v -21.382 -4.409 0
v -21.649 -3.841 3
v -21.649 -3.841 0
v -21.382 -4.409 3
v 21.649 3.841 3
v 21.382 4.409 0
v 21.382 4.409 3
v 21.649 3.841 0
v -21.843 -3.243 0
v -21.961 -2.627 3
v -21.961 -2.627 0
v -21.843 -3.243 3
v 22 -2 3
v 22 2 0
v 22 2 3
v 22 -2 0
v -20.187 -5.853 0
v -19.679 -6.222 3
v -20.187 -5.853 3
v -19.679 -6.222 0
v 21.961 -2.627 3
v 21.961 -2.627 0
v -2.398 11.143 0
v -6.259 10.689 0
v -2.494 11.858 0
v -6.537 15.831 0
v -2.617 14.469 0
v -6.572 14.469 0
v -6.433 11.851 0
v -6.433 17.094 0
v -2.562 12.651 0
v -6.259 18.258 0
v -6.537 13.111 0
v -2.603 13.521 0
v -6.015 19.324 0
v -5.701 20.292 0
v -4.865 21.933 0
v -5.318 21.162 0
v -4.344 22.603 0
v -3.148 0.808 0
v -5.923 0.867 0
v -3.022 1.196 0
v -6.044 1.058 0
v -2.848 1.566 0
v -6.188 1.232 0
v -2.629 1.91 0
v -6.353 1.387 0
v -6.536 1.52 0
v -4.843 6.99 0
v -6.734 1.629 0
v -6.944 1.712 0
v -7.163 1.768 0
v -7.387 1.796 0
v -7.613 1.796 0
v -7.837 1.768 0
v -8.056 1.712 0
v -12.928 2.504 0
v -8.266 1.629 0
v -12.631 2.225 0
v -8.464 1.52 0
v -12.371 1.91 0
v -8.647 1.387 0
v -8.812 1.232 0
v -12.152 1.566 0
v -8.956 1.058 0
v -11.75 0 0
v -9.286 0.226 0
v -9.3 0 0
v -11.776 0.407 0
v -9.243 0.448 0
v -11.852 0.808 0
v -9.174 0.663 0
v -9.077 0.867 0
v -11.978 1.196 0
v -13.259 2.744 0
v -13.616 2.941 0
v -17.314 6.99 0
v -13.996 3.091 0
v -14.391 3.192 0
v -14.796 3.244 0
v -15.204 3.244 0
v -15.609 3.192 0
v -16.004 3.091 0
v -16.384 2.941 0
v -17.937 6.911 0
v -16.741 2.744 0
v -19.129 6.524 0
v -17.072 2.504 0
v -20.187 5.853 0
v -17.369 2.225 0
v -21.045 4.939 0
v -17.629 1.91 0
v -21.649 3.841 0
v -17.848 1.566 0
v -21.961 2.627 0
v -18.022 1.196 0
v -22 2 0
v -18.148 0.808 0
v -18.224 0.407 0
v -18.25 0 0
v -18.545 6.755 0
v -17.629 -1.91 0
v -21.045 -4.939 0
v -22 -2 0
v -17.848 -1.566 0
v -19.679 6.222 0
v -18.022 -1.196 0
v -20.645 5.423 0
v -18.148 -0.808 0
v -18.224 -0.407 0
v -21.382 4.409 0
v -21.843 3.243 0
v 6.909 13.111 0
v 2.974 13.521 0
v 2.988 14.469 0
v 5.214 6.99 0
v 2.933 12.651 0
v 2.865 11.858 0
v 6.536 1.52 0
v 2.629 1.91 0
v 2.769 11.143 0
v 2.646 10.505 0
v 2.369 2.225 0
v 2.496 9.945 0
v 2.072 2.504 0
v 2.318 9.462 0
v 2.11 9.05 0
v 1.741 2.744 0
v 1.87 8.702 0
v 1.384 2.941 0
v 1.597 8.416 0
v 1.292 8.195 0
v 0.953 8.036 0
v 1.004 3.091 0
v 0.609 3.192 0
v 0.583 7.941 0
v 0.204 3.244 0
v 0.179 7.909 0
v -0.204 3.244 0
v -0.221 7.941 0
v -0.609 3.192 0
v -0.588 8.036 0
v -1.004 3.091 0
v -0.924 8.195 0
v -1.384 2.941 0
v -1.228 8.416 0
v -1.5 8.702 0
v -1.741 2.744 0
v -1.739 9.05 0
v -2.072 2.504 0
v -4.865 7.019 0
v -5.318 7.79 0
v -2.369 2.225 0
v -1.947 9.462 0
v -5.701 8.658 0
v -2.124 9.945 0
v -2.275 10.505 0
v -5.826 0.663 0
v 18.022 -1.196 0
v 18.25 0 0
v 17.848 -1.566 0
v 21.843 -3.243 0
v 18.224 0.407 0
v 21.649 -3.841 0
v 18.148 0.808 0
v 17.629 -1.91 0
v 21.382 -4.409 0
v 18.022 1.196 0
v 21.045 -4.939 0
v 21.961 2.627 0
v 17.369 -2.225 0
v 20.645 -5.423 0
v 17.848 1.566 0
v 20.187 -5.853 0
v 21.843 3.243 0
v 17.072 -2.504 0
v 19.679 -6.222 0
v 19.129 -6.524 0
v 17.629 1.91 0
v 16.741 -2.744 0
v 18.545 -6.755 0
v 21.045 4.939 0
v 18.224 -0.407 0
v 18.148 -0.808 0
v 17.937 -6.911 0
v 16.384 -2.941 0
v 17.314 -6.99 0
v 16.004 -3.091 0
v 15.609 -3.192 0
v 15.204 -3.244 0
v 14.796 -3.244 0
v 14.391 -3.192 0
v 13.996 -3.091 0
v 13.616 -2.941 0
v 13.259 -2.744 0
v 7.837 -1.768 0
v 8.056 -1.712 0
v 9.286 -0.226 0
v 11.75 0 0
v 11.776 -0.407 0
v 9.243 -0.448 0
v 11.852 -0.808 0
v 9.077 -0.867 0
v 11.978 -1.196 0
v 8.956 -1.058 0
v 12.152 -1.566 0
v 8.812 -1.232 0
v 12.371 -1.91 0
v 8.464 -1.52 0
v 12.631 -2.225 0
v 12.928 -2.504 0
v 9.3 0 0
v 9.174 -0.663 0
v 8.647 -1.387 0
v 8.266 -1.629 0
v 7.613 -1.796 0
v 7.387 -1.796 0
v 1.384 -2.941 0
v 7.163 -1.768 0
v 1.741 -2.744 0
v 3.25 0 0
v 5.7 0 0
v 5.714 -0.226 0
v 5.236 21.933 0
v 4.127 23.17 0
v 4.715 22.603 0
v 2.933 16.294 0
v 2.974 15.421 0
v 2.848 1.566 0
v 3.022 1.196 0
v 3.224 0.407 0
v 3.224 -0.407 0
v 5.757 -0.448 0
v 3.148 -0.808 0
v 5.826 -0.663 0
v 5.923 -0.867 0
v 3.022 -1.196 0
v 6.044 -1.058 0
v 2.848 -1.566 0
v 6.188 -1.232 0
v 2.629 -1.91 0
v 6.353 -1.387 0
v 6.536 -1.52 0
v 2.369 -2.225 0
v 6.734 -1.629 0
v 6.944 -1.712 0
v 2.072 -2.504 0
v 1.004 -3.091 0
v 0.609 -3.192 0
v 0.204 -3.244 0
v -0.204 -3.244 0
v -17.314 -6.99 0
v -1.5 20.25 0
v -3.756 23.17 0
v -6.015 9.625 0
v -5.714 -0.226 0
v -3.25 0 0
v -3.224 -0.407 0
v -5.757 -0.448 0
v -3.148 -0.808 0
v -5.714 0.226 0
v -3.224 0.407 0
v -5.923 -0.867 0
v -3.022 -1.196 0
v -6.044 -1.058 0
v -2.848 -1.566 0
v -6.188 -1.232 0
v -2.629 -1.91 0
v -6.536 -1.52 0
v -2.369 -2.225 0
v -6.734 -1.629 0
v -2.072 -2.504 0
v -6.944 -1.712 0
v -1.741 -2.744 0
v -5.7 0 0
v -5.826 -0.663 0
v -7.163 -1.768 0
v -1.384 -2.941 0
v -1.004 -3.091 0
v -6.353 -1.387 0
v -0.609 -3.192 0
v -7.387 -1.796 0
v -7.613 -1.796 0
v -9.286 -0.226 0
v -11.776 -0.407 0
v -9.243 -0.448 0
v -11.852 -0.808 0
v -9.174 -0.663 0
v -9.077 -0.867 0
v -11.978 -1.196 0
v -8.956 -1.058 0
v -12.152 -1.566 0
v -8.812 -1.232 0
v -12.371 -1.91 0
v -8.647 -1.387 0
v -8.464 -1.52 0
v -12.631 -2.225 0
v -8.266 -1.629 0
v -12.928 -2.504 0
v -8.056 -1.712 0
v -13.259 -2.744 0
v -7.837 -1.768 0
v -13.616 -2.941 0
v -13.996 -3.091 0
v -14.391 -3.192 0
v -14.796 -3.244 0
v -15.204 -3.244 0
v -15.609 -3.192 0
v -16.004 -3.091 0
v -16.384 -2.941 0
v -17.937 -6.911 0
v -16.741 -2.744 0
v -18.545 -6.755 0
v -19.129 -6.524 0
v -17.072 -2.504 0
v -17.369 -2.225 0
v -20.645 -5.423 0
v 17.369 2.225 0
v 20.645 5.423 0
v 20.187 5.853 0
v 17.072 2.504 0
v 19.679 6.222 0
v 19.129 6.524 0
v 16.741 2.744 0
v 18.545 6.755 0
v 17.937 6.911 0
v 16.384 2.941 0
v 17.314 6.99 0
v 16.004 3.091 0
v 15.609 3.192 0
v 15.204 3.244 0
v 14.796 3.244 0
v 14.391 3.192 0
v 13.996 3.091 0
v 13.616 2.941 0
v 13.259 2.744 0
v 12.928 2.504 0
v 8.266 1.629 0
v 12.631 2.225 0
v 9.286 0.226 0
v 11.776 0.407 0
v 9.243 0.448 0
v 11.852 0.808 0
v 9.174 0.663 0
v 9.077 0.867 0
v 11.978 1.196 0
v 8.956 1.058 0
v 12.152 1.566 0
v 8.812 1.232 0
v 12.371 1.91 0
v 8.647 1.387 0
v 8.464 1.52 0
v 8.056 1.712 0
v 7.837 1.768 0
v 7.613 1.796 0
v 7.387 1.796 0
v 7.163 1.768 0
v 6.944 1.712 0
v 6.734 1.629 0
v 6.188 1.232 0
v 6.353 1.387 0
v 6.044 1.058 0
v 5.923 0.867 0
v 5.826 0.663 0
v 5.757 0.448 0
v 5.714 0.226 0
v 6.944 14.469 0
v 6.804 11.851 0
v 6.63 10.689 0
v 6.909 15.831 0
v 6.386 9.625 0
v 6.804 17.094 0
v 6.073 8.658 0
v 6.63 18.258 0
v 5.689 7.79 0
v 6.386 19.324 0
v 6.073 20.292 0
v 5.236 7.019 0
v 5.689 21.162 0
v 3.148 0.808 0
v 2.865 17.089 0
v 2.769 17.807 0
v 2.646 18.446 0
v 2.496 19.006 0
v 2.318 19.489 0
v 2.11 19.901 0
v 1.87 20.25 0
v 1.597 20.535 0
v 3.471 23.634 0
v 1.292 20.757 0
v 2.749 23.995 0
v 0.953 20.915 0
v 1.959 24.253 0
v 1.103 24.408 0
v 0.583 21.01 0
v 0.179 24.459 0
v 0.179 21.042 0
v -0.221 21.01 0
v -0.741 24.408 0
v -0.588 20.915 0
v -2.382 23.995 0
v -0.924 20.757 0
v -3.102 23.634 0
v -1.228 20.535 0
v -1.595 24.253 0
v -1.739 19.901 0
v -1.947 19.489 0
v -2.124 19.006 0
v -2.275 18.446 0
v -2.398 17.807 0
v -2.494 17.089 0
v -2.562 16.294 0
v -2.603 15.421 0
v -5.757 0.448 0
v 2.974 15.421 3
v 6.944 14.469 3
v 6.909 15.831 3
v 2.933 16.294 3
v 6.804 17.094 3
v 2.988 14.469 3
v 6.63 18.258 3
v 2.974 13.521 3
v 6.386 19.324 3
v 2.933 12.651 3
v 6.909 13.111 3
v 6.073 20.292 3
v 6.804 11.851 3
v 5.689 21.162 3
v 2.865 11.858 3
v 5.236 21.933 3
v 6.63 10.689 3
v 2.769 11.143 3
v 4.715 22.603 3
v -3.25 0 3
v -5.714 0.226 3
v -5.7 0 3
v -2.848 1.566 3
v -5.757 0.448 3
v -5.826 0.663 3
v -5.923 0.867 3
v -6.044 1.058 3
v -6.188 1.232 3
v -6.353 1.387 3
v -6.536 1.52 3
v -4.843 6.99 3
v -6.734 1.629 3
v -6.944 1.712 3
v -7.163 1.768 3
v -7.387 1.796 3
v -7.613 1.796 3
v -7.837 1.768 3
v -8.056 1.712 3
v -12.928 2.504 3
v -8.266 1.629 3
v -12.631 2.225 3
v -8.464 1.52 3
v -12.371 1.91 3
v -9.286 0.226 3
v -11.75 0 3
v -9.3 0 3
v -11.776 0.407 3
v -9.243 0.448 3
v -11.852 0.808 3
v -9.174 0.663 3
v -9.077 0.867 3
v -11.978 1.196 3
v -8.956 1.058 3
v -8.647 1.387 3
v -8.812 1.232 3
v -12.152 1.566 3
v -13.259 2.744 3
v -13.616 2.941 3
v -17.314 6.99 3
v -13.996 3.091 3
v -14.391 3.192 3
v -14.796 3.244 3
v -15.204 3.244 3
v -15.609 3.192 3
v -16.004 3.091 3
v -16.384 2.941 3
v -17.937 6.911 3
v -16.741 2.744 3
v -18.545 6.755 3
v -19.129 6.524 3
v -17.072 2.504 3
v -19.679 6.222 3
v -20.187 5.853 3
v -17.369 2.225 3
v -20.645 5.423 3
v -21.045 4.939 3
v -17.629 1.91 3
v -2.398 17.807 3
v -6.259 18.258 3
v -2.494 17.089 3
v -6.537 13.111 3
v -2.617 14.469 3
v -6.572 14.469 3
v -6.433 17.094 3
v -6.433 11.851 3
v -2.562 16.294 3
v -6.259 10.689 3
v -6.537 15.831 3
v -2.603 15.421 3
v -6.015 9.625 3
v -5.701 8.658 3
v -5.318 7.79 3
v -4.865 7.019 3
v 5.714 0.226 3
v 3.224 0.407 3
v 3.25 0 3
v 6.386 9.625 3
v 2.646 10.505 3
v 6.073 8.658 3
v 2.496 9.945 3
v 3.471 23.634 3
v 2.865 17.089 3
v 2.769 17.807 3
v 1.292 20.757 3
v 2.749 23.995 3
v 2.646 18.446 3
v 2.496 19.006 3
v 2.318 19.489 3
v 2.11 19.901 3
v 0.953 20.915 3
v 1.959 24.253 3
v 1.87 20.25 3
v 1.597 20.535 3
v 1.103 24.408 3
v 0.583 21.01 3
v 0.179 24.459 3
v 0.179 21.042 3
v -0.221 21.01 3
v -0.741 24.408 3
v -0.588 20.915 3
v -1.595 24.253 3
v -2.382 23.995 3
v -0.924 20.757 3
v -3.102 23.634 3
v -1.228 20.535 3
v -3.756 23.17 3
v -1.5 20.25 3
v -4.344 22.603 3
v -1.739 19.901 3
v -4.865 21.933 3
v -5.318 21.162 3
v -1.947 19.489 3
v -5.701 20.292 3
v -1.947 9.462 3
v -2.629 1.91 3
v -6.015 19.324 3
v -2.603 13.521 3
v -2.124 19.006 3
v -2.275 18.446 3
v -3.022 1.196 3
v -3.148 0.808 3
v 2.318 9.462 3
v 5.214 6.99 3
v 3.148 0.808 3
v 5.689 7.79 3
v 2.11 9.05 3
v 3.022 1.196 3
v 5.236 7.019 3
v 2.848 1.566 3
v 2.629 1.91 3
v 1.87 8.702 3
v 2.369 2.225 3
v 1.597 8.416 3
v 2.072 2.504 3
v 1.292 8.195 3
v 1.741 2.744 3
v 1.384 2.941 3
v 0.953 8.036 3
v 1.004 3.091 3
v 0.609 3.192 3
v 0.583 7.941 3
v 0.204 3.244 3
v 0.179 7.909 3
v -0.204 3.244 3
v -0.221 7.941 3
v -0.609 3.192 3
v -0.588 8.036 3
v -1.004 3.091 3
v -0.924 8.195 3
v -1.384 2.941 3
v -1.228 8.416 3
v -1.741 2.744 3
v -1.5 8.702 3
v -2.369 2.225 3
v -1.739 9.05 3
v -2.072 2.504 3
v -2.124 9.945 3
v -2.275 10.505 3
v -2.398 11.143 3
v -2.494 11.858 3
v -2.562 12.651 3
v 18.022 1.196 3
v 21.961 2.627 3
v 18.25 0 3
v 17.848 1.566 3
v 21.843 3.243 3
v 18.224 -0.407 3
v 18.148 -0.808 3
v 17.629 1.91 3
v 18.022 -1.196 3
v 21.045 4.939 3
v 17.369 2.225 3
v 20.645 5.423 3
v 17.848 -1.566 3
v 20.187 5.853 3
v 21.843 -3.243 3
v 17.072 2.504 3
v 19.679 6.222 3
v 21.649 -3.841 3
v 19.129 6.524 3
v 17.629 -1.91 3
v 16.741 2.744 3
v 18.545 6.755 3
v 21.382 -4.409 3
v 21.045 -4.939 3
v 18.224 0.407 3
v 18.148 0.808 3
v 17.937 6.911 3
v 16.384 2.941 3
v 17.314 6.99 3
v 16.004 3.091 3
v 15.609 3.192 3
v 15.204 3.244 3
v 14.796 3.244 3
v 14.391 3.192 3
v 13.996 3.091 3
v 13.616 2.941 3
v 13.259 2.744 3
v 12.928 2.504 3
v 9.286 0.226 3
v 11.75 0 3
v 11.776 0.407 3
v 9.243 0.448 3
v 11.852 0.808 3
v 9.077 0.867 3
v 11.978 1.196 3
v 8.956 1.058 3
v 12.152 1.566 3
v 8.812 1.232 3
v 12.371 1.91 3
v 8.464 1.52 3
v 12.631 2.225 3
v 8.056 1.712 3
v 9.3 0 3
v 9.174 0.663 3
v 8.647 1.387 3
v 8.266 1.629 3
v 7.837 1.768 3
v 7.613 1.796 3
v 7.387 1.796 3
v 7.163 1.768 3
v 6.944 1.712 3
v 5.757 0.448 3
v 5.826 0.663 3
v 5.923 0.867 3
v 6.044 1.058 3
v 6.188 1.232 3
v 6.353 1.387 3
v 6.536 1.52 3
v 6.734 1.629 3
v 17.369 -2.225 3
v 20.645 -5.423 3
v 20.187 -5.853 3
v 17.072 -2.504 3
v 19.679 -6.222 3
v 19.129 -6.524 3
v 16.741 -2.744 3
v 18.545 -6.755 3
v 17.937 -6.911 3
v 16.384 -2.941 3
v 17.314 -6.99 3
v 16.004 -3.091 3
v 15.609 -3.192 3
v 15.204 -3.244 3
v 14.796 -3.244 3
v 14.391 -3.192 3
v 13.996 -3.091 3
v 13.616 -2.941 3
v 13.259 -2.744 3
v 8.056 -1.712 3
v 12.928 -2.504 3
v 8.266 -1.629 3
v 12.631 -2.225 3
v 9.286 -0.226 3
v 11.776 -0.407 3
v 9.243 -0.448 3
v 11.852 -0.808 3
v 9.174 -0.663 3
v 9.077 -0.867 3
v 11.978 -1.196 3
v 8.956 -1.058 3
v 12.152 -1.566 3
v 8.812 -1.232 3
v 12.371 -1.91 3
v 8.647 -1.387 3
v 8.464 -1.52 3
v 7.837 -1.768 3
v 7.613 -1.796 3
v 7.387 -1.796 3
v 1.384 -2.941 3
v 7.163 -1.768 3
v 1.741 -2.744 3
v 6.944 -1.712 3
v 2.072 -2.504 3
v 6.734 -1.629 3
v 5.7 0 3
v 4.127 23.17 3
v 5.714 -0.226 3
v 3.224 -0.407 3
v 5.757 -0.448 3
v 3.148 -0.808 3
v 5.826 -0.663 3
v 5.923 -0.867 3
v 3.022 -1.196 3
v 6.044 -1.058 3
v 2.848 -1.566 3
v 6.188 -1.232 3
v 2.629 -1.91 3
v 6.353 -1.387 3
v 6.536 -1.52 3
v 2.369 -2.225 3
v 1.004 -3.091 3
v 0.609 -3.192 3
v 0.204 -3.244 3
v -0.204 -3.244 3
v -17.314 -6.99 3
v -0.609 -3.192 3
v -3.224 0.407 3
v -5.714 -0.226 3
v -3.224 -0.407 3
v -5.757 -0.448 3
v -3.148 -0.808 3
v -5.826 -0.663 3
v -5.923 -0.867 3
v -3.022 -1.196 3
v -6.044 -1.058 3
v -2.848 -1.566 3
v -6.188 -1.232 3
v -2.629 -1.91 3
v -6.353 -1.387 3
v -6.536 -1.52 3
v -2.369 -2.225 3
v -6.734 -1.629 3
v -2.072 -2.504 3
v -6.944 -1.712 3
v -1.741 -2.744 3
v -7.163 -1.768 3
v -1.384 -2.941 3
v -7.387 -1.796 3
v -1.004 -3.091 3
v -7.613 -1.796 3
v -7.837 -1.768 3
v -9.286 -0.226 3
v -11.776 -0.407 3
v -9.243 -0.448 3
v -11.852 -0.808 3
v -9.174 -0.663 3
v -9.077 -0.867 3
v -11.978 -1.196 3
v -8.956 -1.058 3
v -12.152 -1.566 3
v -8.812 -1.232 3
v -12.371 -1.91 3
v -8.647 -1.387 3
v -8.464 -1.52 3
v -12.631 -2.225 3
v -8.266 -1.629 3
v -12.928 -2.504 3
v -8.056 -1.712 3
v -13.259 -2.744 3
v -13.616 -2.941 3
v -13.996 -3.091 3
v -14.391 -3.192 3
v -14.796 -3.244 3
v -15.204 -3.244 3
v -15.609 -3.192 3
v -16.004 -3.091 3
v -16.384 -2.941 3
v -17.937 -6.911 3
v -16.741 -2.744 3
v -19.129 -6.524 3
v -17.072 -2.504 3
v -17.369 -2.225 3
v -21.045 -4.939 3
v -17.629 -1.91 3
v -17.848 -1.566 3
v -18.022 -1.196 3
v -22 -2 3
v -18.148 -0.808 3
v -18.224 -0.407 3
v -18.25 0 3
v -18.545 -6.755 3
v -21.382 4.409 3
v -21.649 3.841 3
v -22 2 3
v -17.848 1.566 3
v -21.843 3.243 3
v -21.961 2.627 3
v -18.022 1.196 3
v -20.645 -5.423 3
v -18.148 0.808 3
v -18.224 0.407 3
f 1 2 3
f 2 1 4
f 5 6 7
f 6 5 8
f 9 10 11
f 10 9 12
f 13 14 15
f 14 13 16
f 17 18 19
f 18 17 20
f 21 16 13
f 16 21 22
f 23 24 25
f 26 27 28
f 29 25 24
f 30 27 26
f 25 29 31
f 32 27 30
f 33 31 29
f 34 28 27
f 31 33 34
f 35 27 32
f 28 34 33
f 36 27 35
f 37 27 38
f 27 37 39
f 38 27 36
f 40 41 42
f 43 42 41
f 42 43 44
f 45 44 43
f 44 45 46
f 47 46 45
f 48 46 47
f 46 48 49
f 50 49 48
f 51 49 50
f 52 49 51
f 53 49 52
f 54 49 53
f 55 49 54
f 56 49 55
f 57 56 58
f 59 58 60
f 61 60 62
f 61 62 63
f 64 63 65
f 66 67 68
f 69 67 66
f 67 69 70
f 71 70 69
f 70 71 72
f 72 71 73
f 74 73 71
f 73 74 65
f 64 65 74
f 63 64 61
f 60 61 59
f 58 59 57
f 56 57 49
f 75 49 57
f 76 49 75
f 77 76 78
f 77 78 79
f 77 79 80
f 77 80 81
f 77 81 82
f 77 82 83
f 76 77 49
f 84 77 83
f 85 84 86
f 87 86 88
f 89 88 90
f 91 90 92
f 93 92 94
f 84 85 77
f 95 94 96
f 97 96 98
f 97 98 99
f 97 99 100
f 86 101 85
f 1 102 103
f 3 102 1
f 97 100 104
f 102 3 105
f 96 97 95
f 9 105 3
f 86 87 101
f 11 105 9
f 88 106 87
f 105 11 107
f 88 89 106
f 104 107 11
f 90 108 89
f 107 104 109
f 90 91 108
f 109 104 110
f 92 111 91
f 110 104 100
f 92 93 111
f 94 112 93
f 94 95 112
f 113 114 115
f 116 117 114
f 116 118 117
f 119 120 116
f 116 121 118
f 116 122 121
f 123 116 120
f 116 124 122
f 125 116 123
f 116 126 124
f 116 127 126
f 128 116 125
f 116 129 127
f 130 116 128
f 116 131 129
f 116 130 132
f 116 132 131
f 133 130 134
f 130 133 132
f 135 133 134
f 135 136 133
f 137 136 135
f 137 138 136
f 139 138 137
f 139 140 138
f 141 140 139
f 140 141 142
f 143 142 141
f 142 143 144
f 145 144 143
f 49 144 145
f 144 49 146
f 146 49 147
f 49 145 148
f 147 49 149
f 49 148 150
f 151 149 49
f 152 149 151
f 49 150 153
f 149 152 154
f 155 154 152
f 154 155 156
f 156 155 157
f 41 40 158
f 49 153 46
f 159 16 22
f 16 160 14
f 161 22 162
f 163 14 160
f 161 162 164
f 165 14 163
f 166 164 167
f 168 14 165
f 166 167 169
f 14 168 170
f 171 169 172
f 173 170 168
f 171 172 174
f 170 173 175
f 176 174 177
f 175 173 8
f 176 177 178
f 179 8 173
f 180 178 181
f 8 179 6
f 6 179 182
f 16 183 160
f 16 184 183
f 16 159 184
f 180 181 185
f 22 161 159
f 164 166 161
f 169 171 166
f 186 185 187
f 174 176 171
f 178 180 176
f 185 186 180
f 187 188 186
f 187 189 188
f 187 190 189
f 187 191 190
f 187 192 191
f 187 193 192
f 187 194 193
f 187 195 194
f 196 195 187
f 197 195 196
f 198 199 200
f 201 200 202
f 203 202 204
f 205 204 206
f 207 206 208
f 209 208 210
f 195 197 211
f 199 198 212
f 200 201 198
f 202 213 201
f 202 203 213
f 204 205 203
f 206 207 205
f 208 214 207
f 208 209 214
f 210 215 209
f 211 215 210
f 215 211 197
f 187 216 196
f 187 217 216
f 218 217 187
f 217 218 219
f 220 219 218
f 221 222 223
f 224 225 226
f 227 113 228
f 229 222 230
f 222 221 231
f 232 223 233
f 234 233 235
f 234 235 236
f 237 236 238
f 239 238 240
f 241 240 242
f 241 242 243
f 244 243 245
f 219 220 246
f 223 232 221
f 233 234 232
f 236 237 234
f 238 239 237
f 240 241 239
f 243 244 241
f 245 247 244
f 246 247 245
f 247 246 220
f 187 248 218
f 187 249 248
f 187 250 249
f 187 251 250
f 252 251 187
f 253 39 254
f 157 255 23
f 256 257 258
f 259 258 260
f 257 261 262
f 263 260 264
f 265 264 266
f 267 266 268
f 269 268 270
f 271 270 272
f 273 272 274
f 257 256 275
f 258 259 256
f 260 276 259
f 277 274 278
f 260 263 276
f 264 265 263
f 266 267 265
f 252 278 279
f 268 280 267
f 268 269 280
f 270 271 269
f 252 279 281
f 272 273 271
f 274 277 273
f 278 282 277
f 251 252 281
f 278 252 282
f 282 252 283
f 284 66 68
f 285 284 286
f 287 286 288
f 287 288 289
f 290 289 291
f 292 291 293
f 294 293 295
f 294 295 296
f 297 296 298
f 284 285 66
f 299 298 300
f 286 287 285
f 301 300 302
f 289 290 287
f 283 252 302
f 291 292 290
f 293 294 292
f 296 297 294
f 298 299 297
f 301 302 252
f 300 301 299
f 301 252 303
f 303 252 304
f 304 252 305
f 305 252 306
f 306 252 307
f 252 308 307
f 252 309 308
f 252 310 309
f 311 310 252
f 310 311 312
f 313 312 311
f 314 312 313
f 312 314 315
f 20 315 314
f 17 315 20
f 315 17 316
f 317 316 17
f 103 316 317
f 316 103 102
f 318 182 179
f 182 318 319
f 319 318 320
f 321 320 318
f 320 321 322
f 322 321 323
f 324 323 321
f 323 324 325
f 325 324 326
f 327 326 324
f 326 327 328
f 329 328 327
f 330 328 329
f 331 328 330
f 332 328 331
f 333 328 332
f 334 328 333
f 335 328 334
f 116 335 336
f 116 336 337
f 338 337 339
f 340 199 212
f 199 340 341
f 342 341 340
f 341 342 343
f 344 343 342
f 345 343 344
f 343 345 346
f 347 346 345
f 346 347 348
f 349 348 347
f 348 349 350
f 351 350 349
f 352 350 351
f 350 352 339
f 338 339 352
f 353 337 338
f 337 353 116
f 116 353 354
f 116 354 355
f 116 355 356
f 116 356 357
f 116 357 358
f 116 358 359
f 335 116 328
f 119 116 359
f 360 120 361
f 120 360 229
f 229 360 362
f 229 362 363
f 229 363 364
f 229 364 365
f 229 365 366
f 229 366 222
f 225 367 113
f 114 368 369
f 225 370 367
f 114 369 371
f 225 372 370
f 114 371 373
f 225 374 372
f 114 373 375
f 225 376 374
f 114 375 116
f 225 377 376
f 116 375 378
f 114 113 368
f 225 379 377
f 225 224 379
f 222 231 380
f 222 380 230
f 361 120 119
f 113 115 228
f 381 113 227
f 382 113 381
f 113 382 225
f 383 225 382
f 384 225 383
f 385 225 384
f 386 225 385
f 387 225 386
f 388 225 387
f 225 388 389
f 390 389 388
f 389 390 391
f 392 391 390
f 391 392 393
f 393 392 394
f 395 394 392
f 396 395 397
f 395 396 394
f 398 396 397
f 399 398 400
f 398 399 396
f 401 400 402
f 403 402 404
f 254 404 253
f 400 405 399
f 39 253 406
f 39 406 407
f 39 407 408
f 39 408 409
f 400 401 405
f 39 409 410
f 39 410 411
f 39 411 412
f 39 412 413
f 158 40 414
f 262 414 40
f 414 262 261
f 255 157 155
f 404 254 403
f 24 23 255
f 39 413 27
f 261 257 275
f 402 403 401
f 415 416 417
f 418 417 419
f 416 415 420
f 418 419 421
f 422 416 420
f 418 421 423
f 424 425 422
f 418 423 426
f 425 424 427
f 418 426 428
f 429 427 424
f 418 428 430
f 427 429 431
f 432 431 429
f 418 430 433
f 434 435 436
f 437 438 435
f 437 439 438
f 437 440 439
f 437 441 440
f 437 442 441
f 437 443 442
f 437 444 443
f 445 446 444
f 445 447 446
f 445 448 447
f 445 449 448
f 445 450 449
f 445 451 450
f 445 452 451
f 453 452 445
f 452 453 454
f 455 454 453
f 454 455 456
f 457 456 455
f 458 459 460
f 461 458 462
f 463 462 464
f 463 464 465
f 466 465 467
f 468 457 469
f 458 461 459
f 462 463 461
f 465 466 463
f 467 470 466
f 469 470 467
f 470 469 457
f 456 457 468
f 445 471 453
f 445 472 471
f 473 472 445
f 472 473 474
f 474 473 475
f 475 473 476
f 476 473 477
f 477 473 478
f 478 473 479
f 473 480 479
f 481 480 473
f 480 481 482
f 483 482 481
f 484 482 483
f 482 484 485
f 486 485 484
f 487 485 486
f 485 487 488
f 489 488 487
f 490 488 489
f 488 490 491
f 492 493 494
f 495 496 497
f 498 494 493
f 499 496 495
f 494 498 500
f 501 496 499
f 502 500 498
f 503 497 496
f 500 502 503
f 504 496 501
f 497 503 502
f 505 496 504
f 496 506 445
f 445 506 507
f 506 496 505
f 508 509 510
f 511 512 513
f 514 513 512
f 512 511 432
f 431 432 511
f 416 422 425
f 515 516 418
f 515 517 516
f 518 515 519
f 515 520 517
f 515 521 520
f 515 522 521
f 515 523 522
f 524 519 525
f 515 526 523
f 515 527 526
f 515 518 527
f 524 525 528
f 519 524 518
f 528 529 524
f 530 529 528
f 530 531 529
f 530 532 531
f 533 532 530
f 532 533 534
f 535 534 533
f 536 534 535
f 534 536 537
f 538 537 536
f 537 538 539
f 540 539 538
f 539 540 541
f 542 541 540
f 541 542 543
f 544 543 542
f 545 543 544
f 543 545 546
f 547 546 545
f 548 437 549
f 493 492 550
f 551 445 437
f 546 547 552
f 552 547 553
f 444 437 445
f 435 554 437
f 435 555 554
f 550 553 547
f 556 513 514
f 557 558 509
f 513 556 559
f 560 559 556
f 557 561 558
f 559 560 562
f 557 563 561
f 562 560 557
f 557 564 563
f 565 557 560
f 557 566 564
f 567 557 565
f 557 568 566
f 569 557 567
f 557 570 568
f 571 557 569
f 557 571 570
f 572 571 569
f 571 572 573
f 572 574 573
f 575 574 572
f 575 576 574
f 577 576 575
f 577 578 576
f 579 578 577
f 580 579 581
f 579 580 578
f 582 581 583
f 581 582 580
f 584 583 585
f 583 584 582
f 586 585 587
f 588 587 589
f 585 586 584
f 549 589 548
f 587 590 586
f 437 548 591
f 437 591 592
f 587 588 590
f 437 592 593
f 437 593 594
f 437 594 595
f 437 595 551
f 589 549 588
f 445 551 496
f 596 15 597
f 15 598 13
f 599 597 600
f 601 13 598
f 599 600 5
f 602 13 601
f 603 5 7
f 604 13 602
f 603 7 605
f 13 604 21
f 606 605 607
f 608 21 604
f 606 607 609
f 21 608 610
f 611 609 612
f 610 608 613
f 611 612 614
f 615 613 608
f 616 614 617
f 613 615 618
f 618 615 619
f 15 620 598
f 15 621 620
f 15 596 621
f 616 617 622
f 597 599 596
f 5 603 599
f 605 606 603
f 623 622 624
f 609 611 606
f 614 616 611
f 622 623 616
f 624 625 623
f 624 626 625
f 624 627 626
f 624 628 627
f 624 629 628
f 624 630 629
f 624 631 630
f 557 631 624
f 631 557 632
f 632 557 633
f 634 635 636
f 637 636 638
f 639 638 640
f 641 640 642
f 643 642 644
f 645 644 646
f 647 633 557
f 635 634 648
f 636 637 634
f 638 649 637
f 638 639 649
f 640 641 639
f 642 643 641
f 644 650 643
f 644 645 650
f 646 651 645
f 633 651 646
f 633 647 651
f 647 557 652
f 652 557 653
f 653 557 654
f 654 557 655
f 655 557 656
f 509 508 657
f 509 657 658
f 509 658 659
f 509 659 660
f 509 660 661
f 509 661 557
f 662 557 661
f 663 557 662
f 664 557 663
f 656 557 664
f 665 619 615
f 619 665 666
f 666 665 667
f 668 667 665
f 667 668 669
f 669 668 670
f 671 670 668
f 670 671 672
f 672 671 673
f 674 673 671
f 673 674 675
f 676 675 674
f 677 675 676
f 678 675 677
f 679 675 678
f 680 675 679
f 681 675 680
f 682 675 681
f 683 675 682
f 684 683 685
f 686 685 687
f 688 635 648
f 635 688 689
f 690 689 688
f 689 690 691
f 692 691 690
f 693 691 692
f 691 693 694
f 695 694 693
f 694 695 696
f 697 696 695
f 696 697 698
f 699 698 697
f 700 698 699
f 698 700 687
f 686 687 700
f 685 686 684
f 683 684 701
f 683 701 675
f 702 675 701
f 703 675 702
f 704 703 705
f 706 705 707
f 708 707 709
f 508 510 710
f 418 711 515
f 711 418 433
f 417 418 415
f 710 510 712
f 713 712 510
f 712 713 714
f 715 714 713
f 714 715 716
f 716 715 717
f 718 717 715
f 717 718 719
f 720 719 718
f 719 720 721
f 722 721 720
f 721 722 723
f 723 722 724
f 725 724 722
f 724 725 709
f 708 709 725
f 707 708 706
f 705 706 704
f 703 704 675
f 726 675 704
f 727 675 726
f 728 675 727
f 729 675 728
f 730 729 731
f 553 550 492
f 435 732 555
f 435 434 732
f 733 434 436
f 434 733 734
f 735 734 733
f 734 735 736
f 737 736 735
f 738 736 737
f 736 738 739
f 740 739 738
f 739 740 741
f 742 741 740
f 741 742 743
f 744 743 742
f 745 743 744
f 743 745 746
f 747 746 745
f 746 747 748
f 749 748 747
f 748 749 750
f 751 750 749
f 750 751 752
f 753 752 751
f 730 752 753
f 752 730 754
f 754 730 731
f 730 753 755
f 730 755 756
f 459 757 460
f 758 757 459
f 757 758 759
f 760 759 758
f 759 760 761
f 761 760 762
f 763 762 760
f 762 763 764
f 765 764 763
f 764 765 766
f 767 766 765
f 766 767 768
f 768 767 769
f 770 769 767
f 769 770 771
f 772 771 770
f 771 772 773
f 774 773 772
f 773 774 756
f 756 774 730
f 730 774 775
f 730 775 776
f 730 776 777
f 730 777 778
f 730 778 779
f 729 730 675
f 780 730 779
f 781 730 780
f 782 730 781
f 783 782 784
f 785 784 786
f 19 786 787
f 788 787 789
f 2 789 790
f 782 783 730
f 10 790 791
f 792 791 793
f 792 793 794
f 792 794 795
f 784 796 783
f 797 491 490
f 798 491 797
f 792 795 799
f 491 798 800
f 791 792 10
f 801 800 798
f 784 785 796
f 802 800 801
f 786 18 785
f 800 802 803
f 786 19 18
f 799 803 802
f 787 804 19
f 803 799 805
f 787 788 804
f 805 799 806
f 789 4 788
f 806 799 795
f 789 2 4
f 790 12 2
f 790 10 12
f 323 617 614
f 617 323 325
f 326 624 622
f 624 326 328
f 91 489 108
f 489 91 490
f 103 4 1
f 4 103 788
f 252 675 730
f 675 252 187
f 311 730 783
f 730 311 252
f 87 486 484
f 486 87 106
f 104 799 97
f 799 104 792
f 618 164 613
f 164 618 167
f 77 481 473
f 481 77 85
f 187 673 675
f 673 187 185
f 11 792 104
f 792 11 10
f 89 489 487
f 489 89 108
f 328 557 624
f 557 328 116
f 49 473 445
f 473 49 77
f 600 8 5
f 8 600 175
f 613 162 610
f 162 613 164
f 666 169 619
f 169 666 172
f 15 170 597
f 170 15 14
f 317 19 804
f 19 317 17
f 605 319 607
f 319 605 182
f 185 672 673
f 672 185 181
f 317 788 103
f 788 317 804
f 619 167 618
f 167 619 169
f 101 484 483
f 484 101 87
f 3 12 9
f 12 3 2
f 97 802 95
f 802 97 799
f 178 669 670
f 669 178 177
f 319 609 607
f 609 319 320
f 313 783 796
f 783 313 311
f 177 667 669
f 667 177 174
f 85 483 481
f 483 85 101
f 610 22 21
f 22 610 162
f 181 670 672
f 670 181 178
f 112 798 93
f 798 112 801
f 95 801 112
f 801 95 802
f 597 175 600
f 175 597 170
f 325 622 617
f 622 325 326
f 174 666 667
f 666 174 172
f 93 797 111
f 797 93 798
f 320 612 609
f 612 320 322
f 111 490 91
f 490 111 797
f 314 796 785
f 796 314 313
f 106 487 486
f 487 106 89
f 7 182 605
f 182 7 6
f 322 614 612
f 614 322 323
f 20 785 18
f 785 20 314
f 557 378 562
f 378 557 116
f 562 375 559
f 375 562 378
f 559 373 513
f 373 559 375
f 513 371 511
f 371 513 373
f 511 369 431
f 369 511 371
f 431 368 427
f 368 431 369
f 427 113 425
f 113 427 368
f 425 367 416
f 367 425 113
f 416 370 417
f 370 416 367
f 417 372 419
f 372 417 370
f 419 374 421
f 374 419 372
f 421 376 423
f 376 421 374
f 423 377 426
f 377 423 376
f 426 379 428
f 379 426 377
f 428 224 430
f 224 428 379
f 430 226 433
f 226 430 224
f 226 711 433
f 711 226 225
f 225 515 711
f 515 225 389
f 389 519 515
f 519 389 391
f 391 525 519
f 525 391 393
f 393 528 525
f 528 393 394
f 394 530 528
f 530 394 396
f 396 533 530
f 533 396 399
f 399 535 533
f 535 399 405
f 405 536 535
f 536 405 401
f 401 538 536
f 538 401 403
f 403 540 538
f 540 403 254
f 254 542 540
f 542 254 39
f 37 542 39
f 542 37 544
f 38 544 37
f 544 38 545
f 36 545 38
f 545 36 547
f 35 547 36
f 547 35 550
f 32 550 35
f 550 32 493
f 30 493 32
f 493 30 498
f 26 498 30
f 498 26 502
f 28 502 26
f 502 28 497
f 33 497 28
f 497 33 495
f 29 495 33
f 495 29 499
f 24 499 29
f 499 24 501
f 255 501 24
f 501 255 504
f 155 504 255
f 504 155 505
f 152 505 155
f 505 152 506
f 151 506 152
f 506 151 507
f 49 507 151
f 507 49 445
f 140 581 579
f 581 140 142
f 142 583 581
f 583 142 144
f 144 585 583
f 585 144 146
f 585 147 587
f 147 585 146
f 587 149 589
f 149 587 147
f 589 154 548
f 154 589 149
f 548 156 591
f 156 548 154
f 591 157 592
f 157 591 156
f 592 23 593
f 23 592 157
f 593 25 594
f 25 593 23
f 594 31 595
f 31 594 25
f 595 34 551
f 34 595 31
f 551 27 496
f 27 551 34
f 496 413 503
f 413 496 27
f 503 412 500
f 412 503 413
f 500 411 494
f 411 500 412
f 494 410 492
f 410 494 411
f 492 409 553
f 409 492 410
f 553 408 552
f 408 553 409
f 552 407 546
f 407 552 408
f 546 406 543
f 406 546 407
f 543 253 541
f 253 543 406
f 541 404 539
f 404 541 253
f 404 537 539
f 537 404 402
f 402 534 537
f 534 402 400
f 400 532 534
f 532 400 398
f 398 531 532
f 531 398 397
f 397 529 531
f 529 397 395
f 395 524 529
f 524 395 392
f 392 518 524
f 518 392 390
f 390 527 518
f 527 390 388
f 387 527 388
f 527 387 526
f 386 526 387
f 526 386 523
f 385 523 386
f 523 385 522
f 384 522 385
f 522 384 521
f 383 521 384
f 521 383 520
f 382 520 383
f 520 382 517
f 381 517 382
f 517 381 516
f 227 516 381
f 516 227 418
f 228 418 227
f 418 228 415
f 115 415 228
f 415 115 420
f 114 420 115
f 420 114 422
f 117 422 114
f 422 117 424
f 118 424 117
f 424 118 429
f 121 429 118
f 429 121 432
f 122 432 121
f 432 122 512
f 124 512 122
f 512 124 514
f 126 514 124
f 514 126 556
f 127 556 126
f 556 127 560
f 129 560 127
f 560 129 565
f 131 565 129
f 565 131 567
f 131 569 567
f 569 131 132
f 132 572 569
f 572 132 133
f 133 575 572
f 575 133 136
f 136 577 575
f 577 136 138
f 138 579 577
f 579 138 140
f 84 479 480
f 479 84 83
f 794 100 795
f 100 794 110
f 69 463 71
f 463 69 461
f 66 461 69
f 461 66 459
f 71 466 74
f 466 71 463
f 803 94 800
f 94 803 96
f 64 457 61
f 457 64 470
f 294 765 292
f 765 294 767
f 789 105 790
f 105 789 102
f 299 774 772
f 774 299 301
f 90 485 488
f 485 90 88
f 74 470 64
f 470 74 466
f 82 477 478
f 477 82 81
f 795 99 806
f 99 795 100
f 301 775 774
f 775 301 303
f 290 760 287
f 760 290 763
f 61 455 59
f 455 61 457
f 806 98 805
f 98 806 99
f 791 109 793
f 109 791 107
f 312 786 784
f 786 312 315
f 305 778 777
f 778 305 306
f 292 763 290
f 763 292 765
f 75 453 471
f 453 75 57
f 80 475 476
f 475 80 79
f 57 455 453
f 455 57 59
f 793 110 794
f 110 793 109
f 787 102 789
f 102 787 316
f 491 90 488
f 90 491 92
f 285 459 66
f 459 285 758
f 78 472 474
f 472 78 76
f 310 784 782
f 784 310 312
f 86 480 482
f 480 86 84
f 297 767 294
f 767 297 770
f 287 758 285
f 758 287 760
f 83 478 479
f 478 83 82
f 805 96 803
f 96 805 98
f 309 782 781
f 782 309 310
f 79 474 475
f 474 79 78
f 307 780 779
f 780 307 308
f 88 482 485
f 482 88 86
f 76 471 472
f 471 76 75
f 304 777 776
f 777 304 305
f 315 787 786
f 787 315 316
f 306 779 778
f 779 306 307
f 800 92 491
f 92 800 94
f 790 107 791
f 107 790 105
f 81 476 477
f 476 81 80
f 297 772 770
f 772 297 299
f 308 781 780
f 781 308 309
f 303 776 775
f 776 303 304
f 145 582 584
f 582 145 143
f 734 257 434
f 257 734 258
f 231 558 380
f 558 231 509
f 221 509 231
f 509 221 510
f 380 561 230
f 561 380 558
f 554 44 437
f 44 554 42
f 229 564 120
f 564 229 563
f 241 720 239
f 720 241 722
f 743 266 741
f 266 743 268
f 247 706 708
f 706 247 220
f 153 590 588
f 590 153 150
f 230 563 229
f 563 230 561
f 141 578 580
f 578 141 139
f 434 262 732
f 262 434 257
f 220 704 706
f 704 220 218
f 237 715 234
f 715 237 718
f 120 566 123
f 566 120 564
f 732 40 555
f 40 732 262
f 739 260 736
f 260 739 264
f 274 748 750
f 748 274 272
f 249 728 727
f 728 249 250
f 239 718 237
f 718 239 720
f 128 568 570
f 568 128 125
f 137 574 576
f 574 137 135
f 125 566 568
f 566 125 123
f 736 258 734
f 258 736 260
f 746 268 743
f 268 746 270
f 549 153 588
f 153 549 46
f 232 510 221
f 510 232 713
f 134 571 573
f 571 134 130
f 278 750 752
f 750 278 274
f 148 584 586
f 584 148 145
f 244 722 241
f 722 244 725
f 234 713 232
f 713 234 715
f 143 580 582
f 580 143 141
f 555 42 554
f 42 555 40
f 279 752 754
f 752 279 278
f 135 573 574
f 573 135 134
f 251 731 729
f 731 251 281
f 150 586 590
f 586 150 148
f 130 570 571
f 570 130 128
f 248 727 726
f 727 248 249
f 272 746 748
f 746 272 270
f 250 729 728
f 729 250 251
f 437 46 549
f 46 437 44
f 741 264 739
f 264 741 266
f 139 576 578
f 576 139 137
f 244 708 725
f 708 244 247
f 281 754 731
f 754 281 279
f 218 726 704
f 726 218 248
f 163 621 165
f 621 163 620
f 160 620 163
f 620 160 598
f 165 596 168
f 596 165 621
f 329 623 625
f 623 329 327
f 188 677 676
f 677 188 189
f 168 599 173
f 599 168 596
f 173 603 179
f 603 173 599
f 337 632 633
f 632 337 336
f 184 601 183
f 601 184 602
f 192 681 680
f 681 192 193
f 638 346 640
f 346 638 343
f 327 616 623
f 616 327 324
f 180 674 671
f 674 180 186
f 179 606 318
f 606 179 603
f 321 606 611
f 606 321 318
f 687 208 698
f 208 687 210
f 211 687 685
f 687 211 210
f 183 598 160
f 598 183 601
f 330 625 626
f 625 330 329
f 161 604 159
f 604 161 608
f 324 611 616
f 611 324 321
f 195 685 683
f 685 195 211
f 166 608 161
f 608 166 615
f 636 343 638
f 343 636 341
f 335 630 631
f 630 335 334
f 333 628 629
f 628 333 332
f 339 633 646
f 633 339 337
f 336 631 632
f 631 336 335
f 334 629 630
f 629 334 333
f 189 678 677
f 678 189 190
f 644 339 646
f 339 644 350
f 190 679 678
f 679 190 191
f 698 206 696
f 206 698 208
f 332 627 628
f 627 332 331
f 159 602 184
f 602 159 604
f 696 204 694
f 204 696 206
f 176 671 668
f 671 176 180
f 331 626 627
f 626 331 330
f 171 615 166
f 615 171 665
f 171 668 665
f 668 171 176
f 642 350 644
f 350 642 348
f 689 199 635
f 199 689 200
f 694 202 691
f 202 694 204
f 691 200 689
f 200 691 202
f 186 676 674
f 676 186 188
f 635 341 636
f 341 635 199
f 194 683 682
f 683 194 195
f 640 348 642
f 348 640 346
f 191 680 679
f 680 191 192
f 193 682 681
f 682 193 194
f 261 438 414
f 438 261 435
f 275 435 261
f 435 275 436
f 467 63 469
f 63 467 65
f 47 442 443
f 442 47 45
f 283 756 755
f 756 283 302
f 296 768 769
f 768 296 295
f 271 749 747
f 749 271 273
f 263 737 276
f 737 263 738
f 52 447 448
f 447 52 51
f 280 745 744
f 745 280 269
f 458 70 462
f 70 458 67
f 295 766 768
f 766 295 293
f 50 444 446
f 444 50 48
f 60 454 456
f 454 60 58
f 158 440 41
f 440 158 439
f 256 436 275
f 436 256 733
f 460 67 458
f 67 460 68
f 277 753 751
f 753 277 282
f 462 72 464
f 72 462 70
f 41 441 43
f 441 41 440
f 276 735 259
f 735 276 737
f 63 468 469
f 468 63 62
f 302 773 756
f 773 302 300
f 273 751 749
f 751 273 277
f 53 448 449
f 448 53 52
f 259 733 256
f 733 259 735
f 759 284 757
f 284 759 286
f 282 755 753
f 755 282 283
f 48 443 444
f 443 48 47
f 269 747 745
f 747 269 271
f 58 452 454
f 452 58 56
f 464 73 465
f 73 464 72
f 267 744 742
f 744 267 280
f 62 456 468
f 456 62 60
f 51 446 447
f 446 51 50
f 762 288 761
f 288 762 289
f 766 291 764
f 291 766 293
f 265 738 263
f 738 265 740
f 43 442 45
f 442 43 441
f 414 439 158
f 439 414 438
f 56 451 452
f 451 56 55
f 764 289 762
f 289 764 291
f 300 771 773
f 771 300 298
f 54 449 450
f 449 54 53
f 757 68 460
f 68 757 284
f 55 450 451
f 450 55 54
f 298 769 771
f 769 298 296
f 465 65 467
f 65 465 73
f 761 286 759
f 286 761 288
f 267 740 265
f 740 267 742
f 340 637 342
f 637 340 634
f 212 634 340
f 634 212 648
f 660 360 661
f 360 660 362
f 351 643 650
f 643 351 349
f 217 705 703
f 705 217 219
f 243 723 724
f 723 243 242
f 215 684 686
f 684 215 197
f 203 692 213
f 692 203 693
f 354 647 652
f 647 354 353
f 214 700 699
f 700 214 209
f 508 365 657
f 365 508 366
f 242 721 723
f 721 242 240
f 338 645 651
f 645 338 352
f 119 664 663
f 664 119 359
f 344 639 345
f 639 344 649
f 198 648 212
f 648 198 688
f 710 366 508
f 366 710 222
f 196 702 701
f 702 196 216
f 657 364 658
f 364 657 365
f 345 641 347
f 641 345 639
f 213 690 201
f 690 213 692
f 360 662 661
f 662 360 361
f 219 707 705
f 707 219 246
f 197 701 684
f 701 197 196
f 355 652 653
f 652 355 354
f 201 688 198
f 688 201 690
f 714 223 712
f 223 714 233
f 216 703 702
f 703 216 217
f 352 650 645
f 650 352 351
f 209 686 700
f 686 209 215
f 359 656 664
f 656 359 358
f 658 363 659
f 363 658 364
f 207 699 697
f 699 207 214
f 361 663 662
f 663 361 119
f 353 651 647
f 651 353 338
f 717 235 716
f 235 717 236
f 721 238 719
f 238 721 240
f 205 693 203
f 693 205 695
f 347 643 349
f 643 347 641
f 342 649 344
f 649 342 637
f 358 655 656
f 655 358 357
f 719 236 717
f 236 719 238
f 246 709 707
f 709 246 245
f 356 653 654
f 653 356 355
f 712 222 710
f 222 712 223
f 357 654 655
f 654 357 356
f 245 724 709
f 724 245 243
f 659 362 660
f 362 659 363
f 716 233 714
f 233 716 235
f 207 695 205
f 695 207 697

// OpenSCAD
$fn = 50;


difference() {
	union() {
		hull() {
			translate(v = [-17.0000000000, 2.0000000000, 0]) {
				cylinder(h = 3, r = 5);
			}
			translate(v = [17.0000000000, 2.0000000000, 0]) {
				cylinder(h = 3, r = 5);
			}
			translate(v = [-17.0000000000, -2.0000000000, 0]) {
				cylinder(h = 3, r = 5);
			}
			translate(v = [17.0000000000, -2.0000000000, 0]) {
				cylinder(h = 3, r = 5);
			}
		}
		translate(v = [0, 24, 0]) {
			linear_extrude(height = 3) {
				text(font = "DejaVu Sans Mono:style=Bold", halign = "center", size = 19.0000000000, text = "O", valign = "top");
			}
		}
	}
	union() {
		translate(v = [-15.0000000000, 0.0000000000, 0]) {
			translate(v = [0, 0, -100]) {
				cylinder(h = 200, r = 3.2500000000);
			}
		}
		translate(v = [0, 0, -100]) {
			cylinder(h = 200, r = 3.2500000000);
		}
		translate(v = [15.0000000000, 0.0000000000, 0]) {
			translate(v = [0, 0, -100]) {
				cylinder(h = 200, r = 3.2500000000);
			}
		}
		translate(v = [-15.0000000000, 0.0000000000, 0]) {
			translate(v = [0, 0, -100]) {
				cylinder(h = 200, r = 1.8000000000);
			}
		}
		translate(v = [-7.5000000000, 0.0000000000, 0]) {
			translate(v = [0, 0, -100]) {
				cylinder(h = 200, r = 1.8000000000);
			}
		}
		translate(v = [0, 0, -100]) {
			cylinder(h = 200, r = 1.8000000000);
		}
		translate(v = [7.5000000000, 0.0000000000, 0]) {
			translate(v = [0, 0, -100]) {
				cylinder(h = 200, r = 1.8000000000);
			}
		}
		translate(v = [15.0000000000, 0.0000000000, 0]) {
			translate(v = [0, 0, -100]) {
				cylinder(h = 200, r = 1.8000000000);
			}
		}
	}
}
